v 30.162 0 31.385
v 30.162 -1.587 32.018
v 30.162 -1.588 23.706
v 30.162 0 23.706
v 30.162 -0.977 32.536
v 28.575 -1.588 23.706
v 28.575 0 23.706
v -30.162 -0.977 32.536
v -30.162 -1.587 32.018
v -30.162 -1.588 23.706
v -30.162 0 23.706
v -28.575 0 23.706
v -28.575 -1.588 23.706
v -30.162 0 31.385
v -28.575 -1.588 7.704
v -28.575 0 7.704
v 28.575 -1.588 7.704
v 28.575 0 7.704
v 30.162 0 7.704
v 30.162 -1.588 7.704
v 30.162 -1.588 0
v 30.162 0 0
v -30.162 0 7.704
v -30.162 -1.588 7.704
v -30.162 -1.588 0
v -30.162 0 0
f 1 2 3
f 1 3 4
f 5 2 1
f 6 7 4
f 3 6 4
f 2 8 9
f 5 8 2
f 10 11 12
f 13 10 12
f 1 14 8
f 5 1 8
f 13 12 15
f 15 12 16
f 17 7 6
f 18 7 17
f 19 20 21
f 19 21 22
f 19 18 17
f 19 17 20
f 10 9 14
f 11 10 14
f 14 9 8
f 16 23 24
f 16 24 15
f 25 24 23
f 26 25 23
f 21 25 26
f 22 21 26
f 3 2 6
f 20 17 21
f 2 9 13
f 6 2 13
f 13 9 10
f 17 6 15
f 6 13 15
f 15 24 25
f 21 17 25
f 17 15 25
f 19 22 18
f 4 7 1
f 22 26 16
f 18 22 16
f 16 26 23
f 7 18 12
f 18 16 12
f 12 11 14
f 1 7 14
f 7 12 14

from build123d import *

# Parameters (mm, degrees)
BOSS_EXTRUDE1_START = -30.1625
BOSS_EXTRUDE1_DEPTH = 60.325
CUT_EXTRUDE3_REACH  = 45.791
SKETCH2_W           = 60.325
SKETCH2_H           = 6.35
SKETCH3_W           = 1.5875
SKETCH3_H           = 16.002
CUT_EXTRUDE4_DEPTH  = 45.394636066


# Read off the part's stored shape, not the designer's step: Boss-Extrude1
with BuildPart() as part:
    # Boss-Extrude1 outline → Boss-Extrude1 (new body)
    with BuildSketch(Plane.YZ.offset(BOSS_EXTRUDE1_START)):
        Polygon((-1.5875, 33.25479651), (-1.5875, 0), (0, 0), (0, 31.384816574), align=None)
    extrude(amount=BOSS_EXTRUDE1_DEPTH)

    # Sketch2 → Cut-Extrude3 (cut, up to next)
    with BuildSketch(Plane(origin=(0, 18.958587107, 9.052736266), x_dir=(1, 0, 0), z_dir=(0, 0.7623380888196845, 0.6471789847752716)), mode=Mode.PRIVATE) as cut_extrude3_sk1:
        with Locations((0, -33.979180387)):
            Rectangle(SKETCH2_W, SKETCH2_H)
    cut_extrude3_tool1 = extrude(cut_extrude3_sk1.sketch, amount=-CUT_EXTRUDE3_REACH, mode=Mode.PRIVATE) & part.part
    add(cut_extrude3_tool1.solids().sort_by_distance((0, -3.032024, 34.95636))[0], mode=Mode.SUBTRACT)

    # Sketch3 → Cut-Extrude4 (cut, through all)
    with BuildSketch(Plane(origin=(0, 0, 0), x_dir=(1, 0, 0), z_dir=(0, 1, 0))):
        with Locations((29.36875, -15.70482)):
            Rectangle(SKETCH3_W, SKETCH3_H)
        with Locations((-29.36875, -15.70482)):
            Rectangle(SKETCH3_W, SKETCH3_H)
    extrude(amount=-CUT_EXTRUDE4_DEPTH, mode=Mode.SUBTRACT)


solid = part.part
